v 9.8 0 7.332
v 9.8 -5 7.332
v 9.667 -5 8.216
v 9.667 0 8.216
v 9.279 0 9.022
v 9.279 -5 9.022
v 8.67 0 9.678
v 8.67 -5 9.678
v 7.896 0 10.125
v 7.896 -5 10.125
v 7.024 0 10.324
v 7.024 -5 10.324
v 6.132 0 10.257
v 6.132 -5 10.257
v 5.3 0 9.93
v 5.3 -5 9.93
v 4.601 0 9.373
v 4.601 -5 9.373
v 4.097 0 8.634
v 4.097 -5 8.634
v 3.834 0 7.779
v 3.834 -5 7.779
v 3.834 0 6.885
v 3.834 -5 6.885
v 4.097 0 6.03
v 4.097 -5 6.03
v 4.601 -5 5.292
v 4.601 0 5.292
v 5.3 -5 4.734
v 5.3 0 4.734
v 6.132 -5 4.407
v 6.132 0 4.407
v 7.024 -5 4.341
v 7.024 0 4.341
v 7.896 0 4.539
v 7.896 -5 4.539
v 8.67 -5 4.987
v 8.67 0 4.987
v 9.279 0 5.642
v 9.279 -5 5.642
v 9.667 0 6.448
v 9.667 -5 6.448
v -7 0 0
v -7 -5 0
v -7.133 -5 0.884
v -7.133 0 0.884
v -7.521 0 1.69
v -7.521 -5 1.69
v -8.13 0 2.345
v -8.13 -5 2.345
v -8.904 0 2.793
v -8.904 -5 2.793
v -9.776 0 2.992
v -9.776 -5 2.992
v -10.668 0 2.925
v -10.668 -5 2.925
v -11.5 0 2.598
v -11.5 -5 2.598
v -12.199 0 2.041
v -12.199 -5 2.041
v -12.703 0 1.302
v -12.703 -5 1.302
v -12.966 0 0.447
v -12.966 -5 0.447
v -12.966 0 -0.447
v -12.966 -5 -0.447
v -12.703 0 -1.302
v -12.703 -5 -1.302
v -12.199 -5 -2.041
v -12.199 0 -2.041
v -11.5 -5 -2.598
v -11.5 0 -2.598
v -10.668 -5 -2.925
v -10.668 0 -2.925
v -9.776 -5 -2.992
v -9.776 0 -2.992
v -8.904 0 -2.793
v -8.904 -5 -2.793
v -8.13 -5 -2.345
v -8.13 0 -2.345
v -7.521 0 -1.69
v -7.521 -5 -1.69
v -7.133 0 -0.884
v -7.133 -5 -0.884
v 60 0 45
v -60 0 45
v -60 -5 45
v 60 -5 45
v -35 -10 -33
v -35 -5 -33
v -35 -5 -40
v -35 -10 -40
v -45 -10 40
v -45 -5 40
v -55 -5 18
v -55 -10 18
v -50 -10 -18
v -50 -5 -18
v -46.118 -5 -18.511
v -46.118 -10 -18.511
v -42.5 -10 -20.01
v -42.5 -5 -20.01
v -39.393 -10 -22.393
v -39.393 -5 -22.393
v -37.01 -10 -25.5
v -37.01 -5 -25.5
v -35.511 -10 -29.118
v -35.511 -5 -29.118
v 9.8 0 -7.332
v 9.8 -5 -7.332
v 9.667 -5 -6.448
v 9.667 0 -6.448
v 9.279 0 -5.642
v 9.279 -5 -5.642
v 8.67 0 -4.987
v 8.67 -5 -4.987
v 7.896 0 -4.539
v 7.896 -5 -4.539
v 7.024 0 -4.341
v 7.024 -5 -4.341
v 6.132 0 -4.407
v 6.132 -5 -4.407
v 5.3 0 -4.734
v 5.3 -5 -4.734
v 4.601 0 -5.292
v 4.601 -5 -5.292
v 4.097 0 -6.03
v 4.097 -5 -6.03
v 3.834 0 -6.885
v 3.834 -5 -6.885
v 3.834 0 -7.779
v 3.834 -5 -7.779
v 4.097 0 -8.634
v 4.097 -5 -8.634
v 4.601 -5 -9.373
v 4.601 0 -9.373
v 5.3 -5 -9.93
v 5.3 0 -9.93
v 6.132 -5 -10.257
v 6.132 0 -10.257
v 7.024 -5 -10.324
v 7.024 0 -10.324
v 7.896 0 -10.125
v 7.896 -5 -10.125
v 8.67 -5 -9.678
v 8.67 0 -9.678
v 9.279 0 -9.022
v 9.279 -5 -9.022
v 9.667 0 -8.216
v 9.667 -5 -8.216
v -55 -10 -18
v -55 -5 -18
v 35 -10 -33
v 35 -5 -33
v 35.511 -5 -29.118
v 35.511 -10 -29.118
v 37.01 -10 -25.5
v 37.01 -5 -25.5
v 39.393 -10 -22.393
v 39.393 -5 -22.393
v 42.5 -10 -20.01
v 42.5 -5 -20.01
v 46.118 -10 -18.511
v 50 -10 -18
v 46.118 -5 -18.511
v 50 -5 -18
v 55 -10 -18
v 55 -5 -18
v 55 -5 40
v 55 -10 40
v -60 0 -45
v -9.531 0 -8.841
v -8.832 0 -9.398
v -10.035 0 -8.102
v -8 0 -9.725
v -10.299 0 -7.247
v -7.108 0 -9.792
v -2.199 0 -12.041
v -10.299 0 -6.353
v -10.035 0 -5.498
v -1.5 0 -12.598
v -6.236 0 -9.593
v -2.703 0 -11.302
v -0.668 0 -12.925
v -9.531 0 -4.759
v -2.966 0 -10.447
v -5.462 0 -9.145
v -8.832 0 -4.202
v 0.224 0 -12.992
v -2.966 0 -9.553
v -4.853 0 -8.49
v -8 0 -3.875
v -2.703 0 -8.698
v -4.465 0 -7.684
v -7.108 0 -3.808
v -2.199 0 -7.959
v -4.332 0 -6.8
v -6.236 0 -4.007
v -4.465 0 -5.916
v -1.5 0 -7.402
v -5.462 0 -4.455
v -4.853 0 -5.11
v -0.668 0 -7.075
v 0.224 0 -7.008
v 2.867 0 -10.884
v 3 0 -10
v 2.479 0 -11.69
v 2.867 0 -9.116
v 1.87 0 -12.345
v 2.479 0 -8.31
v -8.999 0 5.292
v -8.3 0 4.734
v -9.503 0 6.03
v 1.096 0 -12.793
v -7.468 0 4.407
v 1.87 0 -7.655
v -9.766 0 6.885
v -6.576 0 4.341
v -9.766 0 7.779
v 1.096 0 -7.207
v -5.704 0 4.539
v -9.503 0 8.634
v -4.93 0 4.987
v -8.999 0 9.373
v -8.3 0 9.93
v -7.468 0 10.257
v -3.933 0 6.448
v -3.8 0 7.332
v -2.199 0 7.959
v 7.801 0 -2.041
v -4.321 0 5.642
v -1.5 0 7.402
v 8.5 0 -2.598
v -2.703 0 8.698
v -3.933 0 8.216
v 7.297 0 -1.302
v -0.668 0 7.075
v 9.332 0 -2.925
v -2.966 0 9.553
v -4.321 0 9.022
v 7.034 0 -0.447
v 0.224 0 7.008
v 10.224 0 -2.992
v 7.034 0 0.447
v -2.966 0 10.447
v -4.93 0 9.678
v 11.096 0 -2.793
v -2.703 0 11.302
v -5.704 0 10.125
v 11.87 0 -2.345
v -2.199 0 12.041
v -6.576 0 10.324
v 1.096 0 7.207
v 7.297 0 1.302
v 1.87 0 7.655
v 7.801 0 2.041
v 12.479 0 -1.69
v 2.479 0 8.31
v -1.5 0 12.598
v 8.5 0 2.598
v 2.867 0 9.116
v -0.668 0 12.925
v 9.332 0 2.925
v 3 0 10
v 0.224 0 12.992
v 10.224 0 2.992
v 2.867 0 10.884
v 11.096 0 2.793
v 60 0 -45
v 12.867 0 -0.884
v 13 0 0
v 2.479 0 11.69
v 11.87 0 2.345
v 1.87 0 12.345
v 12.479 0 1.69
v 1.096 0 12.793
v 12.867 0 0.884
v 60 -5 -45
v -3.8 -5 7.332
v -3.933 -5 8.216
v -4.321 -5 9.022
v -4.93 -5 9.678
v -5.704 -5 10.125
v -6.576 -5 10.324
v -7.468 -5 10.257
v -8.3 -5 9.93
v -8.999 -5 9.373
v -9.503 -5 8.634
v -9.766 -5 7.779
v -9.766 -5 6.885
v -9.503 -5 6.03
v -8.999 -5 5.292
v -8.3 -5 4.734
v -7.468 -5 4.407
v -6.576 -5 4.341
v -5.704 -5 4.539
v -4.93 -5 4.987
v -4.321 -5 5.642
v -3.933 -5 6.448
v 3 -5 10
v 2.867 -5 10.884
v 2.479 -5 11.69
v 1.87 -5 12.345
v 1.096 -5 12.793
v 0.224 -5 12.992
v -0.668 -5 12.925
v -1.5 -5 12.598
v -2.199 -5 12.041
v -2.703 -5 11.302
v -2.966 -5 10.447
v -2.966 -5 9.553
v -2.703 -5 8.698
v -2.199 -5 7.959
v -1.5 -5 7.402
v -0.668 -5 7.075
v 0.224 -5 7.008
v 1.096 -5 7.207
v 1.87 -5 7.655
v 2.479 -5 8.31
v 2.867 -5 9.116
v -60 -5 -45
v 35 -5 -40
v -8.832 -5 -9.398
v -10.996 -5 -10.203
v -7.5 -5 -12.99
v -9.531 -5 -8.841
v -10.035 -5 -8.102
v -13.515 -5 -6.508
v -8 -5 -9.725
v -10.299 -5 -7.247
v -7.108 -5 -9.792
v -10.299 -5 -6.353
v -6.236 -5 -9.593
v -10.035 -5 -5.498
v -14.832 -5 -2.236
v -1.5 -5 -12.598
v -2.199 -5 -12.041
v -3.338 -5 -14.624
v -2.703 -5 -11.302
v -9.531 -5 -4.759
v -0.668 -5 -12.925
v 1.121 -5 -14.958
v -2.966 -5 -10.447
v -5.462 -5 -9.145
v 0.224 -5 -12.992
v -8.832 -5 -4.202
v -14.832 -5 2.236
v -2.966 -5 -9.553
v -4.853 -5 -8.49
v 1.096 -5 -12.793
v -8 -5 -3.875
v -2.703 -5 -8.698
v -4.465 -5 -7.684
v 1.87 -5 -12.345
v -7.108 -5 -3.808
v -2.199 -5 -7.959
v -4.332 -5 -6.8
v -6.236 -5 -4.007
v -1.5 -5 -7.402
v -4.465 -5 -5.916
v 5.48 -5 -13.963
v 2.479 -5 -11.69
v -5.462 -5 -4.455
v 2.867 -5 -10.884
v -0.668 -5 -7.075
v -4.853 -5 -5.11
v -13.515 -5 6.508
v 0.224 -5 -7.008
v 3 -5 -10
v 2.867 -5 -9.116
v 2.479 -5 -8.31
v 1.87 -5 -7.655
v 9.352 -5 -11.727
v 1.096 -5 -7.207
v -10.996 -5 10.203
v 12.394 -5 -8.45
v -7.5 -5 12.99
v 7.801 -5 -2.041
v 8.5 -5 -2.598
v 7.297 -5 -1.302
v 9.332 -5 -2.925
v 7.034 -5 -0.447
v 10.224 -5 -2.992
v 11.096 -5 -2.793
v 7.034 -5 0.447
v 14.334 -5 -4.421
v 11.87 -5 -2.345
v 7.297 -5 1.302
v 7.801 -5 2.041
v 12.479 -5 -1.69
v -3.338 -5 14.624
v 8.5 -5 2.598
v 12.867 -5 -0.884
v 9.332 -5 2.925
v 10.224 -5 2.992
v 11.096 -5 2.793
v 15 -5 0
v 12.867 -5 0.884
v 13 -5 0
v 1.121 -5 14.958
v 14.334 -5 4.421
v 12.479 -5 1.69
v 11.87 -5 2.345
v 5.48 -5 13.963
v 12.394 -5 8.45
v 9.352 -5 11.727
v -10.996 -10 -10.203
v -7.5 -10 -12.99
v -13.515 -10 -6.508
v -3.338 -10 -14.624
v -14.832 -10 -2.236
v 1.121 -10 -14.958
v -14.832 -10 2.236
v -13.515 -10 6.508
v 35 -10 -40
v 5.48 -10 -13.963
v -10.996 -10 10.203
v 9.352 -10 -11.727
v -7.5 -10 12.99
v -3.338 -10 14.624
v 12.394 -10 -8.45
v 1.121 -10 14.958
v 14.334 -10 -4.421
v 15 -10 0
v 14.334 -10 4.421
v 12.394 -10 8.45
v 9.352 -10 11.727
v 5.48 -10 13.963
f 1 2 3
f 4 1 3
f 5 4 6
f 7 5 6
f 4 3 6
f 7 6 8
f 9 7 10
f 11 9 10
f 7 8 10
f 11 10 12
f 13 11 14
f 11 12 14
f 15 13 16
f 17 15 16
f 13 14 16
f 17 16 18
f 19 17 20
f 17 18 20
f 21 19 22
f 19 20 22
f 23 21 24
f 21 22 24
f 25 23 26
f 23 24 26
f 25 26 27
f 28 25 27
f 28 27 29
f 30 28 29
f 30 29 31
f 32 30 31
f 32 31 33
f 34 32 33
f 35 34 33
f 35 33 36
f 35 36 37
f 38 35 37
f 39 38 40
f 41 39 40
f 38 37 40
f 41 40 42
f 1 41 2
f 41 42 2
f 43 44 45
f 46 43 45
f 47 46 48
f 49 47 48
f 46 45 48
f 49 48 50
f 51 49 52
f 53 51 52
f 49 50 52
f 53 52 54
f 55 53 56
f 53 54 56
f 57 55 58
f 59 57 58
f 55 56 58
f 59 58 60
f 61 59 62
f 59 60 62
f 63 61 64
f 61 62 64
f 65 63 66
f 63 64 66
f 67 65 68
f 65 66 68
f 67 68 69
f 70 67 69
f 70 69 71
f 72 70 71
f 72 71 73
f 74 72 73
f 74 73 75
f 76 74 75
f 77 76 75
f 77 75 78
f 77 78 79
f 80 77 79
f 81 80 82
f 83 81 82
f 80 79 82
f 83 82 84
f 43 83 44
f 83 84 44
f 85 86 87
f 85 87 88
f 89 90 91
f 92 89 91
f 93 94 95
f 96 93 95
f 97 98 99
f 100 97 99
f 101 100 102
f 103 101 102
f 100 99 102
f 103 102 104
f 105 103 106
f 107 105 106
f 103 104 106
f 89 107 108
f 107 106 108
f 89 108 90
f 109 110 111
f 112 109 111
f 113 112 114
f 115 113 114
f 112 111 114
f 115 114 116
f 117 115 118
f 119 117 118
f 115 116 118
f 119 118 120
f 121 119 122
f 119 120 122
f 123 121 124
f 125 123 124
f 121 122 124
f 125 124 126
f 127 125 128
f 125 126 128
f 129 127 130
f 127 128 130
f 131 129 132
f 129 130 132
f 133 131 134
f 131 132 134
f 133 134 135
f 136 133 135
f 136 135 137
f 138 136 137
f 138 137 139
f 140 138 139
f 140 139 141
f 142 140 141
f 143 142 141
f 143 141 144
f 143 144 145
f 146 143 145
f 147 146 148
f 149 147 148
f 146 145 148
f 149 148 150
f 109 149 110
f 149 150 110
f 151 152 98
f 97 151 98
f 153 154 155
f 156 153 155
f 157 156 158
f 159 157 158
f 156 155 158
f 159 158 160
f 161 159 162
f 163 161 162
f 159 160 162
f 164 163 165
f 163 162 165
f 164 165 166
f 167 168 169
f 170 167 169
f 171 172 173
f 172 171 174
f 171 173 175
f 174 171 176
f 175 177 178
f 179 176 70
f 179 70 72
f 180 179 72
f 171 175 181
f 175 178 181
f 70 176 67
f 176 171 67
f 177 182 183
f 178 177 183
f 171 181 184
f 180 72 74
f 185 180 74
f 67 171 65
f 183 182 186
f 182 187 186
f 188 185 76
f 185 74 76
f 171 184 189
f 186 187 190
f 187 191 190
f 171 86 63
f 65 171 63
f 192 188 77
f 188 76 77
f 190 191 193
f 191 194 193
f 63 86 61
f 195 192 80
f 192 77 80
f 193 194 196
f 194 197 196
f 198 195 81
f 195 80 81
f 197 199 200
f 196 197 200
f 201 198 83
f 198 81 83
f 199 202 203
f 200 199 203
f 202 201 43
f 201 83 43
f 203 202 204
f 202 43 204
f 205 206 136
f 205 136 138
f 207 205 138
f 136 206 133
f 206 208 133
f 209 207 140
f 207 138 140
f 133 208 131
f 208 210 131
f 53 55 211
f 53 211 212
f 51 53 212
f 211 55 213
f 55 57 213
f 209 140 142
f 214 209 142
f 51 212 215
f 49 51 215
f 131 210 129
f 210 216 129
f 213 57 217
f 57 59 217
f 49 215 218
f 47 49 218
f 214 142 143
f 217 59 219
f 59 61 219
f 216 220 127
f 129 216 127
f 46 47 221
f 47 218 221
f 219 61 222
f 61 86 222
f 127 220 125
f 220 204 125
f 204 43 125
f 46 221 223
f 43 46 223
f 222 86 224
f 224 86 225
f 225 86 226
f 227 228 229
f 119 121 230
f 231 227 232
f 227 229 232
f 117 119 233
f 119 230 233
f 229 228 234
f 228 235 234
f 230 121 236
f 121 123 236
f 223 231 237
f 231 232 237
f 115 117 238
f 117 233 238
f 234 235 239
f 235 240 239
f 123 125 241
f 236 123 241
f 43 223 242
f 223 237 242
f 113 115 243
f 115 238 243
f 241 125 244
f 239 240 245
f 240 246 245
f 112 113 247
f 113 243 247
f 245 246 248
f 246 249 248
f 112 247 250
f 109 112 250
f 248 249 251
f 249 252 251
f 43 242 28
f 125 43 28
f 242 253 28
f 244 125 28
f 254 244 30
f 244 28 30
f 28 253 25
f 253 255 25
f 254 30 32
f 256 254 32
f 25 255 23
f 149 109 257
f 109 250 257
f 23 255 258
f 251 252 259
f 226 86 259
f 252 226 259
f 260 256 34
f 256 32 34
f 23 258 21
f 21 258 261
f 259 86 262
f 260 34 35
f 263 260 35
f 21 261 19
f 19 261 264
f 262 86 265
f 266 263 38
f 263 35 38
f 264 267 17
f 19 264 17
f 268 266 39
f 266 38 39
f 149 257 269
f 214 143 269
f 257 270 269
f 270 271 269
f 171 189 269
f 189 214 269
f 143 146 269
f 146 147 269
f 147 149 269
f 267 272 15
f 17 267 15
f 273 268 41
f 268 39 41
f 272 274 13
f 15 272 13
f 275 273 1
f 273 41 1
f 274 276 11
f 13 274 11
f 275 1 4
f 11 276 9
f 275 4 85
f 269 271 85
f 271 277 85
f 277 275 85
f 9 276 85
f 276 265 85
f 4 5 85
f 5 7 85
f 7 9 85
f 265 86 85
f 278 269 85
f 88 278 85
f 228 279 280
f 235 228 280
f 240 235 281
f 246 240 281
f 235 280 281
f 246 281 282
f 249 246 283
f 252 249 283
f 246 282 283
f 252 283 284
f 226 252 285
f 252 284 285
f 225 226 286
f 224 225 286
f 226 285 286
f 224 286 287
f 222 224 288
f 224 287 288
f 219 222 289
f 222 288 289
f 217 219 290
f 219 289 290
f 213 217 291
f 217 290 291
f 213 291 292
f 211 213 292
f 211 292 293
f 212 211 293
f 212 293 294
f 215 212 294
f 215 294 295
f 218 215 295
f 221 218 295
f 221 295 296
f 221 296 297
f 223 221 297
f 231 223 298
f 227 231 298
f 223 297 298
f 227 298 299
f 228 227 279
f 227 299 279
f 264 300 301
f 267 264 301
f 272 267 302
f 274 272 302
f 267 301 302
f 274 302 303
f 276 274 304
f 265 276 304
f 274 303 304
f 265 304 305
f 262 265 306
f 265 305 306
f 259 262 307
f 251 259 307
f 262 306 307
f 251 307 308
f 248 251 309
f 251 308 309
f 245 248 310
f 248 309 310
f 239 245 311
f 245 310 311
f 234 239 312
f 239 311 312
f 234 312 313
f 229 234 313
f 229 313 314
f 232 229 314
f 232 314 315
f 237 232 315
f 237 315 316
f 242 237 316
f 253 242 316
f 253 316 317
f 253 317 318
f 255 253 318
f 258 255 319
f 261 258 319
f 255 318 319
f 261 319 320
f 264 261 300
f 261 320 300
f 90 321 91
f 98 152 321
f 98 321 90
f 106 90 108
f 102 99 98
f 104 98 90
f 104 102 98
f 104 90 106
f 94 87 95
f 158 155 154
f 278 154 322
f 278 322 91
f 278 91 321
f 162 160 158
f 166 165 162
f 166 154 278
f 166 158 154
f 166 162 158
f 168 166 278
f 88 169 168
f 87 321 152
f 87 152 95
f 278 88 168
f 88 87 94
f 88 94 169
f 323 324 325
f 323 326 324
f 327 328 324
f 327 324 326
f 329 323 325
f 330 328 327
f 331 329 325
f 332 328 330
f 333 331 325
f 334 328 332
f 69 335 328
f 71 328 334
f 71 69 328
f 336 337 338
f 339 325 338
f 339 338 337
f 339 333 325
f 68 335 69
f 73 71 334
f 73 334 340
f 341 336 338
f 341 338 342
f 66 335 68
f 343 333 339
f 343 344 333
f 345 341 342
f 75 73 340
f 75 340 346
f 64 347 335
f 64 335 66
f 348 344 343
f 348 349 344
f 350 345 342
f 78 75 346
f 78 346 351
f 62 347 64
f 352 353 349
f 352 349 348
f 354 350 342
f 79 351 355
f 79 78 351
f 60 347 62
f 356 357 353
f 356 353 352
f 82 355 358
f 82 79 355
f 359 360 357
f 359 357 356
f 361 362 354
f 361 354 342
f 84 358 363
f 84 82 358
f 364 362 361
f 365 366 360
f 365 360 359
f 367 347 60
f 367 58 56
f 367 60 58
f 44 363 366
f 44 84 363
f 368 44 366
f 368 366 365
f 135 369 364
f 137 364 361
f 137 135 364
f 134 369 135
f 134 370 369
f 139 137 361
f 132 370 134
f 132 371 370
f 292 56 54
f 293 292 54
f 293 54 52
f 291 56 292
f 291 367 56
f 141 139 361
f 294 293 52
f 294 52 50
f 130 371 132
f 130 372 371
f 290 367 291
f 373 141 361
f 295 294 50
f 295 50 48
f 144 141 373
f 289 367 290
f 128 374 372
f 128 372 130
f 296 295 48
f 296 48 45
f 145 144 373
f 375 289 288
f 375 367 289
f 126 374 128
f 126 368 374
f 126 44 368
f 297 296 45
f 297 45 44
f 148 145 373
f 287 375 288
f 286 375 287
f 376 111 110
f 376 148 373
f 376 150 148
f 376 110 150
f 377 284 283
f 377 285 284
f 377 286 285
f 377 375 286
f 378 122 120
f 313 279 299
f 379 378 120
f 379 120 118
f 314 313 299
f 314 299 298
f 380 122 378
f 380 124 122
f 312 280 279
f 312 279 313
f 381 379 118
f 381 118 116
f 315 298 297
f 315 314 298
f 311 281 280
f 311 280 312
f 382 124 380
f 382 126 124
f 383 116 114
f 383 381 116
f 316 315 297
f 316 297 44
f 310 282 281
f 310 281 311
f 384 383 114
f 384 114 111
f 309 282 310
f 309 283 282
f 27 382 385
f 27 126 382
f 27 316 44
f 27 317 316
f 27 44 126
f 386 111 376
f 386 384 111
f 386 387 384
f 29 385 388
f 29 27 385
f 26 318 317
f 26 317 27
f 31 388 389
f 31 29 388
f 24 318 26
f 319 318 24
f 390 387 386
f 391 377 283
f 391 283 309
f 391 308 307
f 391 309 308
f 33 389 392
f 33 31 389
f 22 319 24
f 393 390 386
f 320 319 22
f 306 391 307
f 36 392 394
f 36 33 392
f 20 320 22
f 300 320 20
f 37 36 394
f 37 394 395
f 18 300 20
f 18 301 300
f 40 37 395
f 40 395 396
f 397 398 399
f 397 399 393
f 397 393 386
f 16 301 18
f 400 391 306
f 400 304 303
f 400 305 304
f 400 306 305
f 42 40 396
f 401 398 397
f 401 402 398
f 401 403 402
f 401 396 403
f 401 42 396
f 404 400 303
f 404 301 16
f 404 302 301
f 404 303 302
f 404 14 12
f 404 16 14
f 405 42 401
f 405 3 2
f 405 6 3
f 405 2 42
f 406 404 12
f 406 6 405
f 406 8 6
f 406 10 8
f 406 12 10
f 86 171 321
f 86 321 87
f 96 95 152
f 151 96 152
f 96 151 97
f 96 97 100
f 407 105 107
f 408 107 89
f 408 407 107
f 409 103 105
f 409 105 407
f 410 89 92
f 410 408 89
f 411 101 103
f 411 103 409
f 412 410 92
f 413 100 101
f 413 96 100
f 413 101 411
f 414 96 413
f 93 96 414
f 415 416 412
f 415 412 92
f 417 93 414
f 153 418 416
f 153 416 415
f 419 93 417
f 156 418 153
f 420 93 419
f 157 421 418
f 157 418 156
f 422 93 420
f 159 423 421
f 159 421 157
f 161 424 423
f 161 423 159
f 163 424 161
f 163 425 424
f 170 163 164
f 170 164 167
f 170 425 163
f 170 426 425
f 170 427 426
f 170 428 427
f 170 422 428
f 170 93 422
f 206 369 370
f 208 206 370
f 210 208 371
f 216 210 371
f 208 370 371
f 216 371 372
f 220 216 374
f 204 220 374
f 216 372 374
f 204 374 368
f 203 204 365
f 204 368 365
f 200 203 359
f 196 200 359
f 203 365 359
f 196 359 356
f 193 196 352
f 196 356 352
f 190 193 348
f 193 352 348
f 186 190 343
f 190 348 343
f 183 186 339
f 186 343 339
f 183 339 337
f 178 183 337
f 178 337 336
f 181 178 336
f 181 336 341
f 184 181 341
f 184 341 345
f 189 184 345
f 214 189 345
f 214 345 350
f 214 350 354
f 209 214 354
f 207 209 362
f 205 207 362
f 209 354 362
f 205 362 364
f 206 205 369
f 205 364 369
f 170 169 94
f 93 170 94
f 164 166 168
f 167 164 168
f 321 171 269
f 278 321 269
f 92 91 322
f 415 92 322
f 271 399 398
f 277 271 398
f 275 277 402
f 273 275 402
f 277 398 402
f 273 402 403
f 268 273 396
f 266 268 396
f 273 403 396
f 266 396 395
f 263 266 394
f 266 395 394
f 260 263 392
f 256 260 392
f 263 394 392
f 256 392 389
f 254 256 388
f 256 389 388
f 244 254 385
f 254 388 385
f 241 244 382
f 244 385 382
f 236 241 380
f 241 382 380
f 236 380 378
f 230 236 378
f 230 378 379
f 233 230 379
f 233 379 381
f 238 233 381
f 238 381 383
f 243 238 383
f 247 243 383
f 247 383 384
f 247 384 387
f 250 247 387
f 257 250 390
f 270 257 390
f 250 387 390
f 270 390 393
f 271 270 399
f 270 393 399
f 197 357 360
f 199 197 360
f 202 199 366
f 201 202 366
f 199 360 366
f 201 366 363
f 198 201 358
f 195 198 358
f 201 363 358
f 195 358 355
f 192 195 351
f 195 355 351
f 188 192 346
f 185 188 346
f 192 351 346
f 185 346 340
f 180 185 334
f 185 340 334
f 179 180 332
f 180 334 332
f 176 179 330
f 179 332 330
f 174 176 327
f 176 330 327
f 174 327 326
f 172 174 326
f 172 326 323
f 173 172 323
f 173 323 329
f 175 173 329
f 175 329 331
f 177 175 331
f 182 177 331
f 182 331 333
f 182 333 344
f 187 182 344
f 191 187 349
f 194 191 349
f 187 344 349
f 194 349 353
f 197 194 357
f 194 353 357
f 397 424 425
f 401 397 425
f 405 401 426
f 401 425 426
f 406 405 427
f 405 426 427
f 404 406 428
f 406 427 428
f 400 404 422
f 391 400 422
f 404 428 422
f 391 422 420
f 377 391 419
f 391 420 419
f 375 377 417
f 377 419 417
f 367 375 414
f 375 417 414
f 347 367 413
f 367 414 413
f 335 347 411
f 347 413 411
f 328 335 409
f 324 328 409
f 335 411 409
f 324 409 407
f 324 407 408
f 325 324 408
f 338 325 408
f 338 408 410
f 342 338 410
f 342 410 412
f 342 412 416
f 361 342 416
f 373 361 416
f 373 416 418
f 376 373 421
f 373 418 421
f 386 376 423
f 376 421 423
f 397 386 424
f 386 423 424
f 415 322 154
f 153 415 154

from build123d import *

# Parameters (mm, degrees)
F0_W     = 120
F0_H     = 90
F1_DEPTH = 5
F3_DEPTH = 5
F4_R     = 15
F5_DEPTH = 5
F6_R     = 3
F7_DEPTH = 5


with BuildPart() as f1:
    # F0 (on Front) → F1 (new body)
    with BuildSketch(Plane.XZ):
        Rectangle(F0_W, F0_H)
    extrude(amount=F1_DEPTH)

    # F2 (on face) → F3 (join)
    with BuildSketch(Plane.XZ.offset(5)):
        with BuildLine():
            Line((55, -18), (55, 40))
            Line((55, 40), (-45, 40))
            Line((-45, 40), (-55, 18))
            Line((-55, 18), (-55, -18))
            Line((-55, -18), (-50, -18))
            ThreePointArc((-50, -18), (-39.393398, -22.393398), (-35, -33))
            Line((-35, -33), (-35, -40))
            Line((-35, -40), (35, -40))
            Line((35, -40), (35, -33))
            ThreePointArc((35, -33), (39.393398, -22.393398), (50, -18))
            Line((50, -18), (55, -18))
        make_face()
    extrude(amount=F3_DEPTH)

    # F4 (on face) → F5 (cut)
    with BuildSketch(Plane.XZ.offset(10)):
        Circle(F4_R)
    extrude(amount=-F5_DEPTH, mode=Mode.SUBTRACT)

    # F6 (on face) → F7 (cut)
    with BuildSketch(Plane.XZ.offset(5)):
        with Locations((0, 10)):
            Circle(F6_R)
        with Locations((-6.8, 7.332121)):
            Circle(F6_R)
        with Locations((-10, 0)):
            Circle(F6_R)
        with Locations((-7.332121, -6.8)):
            Circle(F6_R)
        with Locations((0, -10)):
            Circle(F6_R)
        with Locations((6.8, -7.332121)):
            Circle(F6_R)
        with Locations((10, 0)):
            Circle(F6_R)
        with Locations((6.8, 7.332121)):
            Circle(F6_R)
    extrude(amount=-F7_DEPTH, mode=Mode.SUBTRACT)


solid = f1.part
